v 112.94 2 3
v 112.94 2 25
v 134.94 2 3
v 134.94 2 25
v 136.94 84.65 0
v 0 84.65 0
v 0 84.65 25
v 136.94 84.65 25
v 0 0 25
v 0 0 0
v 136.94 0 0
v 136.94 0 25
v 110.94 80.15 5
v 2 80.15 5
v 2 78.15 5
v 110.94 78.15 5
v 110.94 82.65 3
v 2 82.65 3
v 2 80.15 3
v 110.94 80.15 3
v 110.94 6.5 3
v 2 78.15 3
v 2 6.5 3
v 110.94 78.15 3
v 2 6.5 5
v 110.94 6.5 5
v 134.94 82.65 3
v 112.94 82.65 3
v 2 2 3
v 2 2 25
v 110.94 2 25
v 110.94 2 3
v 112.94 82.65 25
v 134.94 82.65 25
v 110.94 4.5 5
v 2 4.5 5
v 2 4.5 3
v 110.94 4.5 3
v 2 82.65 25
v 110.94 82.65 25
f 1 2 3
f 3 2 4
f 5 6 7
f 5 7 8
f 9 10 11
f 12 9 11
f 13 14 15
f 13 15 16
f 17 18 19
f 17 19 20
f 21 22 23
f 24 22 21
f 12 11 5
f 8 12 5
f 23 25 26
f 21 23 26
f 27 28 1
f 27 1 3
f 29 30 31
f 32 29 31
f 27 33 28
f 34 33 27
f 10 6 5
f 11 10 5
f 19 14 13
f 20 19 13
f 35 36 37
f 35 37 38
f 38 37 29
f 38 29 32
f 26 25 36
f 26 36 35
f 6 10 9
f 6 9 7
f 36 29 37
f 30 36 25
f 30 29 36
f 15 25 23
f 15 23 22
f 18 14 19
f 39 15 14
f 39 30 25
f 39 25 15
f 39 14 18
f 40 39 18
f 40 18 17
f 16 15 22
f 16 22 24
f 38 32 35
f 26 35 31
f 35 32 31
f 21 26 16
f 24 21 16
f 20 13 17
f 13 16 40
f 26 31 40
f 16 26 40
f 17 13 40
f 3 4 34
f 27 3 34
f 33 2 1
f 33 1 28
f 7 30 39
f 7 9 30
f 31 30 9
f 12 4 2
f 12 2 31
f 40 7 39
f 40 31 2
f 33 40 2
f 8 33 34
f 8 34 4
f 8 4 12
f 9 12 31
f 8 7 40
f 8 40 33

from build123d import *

# Parameters (mm, degrees)
F0_W     = 136.94
F0_H     = 84.65
F1_DEPTH = 25
F2_W     = 108.94
F2_H     = 71.65
F2_H_2   = 2.5
F3_DEPTH = 22
F4_W     = 22
F4_H     = 80.65
F5_DEPTH = 22
F6_W     = 108.94
F6_H     = 2
F7_DEPTH = 20


with BuildPart() as f1:
    # F0 (on Top) → F1 (new body)
    with BuildSketch(Plane.XY):
        with Locations((68.47, 42.325)):
            Rectangle(F0_W, F0_H)
    extrude(amount=F1_DEPTH)

    # F2 (on face) → F3 (cut)
    with BuildSketch(Plane.XY.offset(25)):
        with Locations((56.47, 42.325)):
            Rectangle(F2_W, F2_H)
        with Locations((56.47, 3.25)):
            Rectangle(F2_W, F2_H_2)
        with Locations((56.47, 81.4)):
            Rectangle(F2_W, F2_H_2)
    extrude(amount=-F3_DEPTH, mode=Mode.SUBTRACT)

    # F4 (on face) → F5 (cut)
    with BuildSketch(Plane.XY.offset(25)):
        with Locations((123.94, 42.325)):
            Rectangle(F4_W, F4_H)
    extrude(amount=-F5_DEPTH, mode=Mode.SUBTRACT)

    # F6 (on face) → F7 (cut)
    with BuildSketch(Plane.XY.offset(25)):
        with Locations((56.47, 79.15)):
            Rectangle(F6_W, F6_H)
        with Locations((56.47, 5.5)):
            Rectangle(F6_W, F6_H)
    extrude(amount=-F7_DEPTH, mode=Mode.SUBTRACT)


solid = f1.part
